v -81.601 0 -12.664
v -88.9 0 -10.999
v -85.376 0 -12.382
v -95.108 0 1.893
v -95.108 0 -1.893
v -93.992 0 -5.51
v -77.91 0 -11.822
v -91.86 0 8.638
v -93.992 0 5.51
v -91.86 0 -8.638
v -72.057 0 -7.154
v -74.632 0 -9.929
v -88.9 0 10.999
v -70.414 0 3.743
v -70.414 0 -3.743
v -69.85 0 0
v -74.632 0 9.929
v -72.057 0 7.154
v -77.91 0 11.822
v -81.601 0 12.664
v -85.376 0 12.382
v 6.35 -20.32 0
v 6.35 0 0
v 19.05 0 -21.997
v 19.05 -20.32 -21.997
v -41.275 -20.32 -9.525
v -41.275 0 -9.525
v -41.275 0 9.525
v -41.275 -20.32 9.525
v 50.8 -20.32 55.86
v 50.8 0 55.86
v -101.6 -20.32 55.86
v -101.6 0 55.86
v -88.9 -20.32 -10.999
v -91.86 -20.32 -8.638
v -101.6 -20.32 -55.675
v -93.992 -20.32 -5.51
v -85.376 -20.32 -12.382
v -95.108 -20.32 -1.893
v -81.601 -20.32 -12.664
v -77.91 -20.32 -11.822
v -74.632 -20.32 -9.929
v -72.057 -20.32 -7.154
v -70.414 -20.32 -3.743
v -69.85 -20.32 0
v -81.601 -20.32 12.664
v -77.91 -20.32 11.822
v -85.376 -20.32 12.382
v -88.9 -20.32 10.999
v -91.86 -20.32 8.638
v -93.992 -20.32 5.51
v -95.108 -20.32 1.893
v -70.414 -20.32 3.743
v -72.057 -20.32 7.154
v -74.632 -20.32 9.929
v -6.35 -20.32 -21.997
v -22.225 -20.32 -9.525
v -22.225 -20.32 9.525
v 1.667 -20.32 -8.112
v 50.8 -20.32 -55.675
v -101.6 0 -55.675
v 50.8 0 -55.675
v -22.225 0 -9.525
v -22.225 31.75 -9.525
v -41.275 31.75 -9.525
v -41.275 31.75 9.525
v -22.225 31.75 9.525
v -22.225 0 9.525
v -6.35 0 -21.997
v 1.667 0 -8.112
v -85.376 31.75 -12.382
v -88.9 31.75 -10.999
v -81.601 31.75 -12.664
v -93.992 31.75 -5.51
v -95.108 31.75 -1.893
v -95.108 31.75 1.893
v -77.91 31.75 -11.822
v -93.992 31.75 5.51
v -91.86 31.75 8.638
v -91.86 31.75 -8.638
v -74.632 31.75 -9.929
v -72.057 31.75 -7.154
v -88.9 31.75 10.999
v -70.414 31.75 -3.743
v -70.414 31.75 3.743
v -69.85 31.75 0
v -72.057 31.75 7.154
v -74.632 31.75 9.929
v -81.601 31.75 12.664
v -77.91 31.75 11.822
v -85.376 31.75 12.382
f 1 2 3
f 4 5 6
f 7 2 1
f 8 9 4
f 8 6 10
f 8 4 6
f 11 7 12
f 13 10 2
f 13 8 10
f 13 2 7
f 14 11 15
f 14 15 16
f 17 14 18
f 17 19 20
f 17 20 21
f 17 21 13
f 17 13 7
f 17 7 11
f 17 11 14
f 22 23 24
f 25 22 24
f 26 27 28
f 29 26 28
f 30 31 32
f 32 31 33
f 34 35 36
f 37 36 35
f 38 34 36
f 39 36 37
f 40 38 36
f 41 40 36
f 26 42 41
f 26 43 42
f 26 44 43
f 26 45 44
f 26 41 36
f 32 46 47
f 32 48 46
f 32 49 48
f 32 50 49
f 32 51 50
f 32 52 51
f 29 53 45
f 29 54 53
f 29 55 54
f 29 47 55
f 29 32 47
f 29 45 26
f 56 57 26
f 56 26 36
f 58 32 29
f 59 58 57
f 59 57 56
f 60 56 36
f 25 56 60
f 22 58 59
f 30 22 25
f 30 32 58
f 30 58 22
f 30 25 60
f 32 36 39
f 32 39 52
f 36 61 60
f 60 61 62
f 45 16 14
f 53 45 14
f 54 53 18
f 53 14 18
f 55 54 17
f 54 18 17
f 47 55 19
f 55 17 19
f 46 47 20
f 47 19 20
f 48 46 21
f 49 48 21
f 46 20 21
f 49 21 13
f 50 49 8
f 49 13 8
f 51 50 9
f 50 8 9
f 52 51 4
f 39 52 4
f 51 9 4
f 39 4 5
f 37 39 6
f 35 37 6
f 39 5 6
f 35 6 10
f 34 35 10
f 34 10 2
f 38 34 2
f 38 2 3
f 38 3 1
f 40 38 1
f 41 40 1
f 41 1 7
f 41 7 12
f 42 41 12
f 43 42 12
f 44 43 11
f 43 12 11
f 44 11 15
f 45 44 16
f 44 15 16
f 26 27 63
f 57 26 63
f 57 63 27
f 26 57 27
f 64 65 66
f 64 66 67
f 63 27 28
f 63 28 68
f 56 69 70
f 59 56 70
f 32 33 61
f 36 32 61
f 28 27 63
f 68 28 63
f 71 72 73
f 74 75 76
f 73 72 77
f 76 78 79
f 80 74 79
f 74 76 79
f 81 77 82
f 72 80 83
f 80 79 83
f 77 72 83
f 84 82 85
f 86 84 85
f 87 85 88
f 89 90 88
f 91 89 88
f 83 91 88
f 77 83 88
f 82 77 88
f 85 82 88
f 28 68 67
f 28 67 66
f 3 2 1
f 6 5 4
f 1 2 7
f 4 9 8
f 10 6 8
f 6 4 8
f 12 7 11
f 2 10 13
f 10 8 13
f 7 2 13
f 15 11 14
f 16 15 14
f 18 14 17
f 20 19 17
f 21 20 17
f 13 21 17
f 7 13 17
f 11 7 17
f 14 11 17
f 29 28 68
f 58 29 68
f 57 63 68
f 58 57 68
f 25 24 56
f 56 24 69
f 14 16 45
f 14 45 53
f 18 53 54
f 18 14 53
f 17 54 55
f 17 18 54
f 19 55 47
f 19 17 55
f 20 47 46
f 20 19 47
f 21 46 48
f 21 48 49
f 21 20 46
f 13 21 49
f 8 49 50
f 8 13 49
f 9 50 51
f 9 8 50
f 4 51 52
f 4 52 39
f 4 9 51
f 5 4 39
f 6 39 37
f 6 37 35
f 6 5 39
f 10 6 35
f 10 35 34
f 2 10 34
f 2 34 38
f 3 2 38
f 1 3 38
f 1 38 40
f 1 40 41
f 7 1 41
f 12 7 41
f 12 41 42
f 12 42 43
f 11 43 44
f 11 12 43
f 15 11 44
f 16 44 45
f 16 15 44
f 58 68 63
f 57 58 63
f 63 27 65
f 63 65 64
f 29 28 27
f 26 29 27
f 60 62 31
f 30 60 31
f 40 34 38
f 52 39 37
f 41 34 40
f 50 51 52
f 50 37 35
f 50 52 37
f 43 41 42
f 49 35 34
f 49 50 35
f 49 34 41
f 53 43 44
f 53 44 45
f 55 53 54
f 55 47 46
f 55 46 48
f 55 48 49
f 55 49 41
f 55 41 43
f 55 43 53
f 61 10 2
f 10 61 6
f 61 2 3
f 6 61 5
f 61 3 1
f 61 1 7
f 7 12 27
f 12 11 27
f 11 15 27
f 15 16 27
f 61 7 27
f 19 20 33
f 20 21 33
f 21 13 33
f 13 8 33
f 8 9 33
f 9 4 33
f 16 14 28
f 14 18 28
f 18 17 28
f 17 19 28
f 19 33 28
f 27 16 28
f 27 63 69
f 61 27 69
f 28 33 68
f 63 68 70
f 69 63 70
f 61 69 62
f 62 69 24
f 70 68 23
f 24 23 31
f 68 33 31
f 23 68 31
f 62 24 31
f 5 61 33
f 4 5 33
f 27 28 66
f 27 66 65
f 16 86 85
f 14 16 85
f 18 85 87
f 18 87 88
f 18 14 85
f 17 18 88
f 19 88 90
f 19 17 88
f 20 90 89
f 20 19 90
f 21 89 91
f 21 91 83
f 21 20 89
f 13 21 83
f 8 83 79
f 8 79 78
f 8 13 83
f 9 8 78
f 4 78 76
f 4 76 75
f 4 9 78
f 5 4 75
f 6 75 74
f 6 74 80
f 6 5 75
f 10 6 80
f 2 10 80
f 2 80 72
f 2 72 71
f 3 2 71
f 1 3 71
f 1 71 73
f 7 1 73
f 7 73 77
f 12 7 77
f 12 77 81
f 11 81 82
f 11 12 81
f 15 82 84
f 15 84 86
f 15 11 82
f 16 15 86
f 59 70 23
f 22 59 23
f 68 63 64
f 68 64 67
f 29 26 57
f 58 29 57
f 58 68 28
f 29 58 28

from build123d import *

# Parameters (mm, degrees)
F0_R     = 12.7
F1_DEPTH = 20.32
F2_DEPTH = 31.75
F3_DEPTH = 20.32


with BuildPart() as f1:
    # F0 (on Front) → F1 (new body)
    with BuildSketch(Plane.XZ):
        Polygon((50.8, -55.6751601398), (50.8, 0), (50.8, 55.8595135808), (-101.6, 55.8595135808), (-101.6, -55.6751601398), align=None)
        with Locations((-82.55, 0)):
            Circle(F0_R, mode=Mode.SUBTRACT)
        Polygon((-22.225, 9.525), (-22.225, 0), (-22.225, -9.525), (-41.275, -9.525), (-41.275, 0), (-41.275, 9.525), align=None, mode=Mode.SUBTRACT)
        Polygon((1.6667581252, -8.1116128713), (6.35, 0), (19.05, -21.9970452561), (-6.35, -21.9970452561), align=None, mode=Mode.SUBTRACT)
    extrude(amount=F1_DEPTH)


with BuildPart() as f2:
    # F0 (on Front) → F2 (new body)
    with BuildSketch(Plane.XZ):
        with Locations((-82.55, 0)):
            Circle(F0_R)
    extrude(amount=-F2_DEPTH)


with BuildPart() as f2b:
    # F0 (on Front) → F2, piece 2 (new body)
    with BuildSketch(Plane.XZ):
        Polygon((-22.225, -9.525), (-22.225, 0), (-31.75, 0), (-41.275, 0), (-41.275, -9.525), align=None)
        Polygon((-31.75, 0), (-22.225, 0), (-22.225, 9.525), (-41.275, 9.525), (-41.275, 0), align=None)
    extrude(amount=-F2_DEPTH)


with BuildPart() as f3:
    # F3 (new): a face of the model
    f3_faces = [f2.part.faces().sort_by_distance(p)[0] for p in [
        (-82.55, 0, 0),
    ]]
    extrude(f3_faces, amount=F3_DEPTH)


with BuildPart() as f3b:
    # F3#2 (new): a face of the model
    f3_2_faces = [f2b.part.faces().sort_by_distance(p)[0] for p in [
        (-31.75, 0, 0),
    ]]
    extrude(f3_2_faces, amount=F3_DEPTH)


solid = Compound([f1.part, f2.part, f2b.part, f3.part, f3b.part])
